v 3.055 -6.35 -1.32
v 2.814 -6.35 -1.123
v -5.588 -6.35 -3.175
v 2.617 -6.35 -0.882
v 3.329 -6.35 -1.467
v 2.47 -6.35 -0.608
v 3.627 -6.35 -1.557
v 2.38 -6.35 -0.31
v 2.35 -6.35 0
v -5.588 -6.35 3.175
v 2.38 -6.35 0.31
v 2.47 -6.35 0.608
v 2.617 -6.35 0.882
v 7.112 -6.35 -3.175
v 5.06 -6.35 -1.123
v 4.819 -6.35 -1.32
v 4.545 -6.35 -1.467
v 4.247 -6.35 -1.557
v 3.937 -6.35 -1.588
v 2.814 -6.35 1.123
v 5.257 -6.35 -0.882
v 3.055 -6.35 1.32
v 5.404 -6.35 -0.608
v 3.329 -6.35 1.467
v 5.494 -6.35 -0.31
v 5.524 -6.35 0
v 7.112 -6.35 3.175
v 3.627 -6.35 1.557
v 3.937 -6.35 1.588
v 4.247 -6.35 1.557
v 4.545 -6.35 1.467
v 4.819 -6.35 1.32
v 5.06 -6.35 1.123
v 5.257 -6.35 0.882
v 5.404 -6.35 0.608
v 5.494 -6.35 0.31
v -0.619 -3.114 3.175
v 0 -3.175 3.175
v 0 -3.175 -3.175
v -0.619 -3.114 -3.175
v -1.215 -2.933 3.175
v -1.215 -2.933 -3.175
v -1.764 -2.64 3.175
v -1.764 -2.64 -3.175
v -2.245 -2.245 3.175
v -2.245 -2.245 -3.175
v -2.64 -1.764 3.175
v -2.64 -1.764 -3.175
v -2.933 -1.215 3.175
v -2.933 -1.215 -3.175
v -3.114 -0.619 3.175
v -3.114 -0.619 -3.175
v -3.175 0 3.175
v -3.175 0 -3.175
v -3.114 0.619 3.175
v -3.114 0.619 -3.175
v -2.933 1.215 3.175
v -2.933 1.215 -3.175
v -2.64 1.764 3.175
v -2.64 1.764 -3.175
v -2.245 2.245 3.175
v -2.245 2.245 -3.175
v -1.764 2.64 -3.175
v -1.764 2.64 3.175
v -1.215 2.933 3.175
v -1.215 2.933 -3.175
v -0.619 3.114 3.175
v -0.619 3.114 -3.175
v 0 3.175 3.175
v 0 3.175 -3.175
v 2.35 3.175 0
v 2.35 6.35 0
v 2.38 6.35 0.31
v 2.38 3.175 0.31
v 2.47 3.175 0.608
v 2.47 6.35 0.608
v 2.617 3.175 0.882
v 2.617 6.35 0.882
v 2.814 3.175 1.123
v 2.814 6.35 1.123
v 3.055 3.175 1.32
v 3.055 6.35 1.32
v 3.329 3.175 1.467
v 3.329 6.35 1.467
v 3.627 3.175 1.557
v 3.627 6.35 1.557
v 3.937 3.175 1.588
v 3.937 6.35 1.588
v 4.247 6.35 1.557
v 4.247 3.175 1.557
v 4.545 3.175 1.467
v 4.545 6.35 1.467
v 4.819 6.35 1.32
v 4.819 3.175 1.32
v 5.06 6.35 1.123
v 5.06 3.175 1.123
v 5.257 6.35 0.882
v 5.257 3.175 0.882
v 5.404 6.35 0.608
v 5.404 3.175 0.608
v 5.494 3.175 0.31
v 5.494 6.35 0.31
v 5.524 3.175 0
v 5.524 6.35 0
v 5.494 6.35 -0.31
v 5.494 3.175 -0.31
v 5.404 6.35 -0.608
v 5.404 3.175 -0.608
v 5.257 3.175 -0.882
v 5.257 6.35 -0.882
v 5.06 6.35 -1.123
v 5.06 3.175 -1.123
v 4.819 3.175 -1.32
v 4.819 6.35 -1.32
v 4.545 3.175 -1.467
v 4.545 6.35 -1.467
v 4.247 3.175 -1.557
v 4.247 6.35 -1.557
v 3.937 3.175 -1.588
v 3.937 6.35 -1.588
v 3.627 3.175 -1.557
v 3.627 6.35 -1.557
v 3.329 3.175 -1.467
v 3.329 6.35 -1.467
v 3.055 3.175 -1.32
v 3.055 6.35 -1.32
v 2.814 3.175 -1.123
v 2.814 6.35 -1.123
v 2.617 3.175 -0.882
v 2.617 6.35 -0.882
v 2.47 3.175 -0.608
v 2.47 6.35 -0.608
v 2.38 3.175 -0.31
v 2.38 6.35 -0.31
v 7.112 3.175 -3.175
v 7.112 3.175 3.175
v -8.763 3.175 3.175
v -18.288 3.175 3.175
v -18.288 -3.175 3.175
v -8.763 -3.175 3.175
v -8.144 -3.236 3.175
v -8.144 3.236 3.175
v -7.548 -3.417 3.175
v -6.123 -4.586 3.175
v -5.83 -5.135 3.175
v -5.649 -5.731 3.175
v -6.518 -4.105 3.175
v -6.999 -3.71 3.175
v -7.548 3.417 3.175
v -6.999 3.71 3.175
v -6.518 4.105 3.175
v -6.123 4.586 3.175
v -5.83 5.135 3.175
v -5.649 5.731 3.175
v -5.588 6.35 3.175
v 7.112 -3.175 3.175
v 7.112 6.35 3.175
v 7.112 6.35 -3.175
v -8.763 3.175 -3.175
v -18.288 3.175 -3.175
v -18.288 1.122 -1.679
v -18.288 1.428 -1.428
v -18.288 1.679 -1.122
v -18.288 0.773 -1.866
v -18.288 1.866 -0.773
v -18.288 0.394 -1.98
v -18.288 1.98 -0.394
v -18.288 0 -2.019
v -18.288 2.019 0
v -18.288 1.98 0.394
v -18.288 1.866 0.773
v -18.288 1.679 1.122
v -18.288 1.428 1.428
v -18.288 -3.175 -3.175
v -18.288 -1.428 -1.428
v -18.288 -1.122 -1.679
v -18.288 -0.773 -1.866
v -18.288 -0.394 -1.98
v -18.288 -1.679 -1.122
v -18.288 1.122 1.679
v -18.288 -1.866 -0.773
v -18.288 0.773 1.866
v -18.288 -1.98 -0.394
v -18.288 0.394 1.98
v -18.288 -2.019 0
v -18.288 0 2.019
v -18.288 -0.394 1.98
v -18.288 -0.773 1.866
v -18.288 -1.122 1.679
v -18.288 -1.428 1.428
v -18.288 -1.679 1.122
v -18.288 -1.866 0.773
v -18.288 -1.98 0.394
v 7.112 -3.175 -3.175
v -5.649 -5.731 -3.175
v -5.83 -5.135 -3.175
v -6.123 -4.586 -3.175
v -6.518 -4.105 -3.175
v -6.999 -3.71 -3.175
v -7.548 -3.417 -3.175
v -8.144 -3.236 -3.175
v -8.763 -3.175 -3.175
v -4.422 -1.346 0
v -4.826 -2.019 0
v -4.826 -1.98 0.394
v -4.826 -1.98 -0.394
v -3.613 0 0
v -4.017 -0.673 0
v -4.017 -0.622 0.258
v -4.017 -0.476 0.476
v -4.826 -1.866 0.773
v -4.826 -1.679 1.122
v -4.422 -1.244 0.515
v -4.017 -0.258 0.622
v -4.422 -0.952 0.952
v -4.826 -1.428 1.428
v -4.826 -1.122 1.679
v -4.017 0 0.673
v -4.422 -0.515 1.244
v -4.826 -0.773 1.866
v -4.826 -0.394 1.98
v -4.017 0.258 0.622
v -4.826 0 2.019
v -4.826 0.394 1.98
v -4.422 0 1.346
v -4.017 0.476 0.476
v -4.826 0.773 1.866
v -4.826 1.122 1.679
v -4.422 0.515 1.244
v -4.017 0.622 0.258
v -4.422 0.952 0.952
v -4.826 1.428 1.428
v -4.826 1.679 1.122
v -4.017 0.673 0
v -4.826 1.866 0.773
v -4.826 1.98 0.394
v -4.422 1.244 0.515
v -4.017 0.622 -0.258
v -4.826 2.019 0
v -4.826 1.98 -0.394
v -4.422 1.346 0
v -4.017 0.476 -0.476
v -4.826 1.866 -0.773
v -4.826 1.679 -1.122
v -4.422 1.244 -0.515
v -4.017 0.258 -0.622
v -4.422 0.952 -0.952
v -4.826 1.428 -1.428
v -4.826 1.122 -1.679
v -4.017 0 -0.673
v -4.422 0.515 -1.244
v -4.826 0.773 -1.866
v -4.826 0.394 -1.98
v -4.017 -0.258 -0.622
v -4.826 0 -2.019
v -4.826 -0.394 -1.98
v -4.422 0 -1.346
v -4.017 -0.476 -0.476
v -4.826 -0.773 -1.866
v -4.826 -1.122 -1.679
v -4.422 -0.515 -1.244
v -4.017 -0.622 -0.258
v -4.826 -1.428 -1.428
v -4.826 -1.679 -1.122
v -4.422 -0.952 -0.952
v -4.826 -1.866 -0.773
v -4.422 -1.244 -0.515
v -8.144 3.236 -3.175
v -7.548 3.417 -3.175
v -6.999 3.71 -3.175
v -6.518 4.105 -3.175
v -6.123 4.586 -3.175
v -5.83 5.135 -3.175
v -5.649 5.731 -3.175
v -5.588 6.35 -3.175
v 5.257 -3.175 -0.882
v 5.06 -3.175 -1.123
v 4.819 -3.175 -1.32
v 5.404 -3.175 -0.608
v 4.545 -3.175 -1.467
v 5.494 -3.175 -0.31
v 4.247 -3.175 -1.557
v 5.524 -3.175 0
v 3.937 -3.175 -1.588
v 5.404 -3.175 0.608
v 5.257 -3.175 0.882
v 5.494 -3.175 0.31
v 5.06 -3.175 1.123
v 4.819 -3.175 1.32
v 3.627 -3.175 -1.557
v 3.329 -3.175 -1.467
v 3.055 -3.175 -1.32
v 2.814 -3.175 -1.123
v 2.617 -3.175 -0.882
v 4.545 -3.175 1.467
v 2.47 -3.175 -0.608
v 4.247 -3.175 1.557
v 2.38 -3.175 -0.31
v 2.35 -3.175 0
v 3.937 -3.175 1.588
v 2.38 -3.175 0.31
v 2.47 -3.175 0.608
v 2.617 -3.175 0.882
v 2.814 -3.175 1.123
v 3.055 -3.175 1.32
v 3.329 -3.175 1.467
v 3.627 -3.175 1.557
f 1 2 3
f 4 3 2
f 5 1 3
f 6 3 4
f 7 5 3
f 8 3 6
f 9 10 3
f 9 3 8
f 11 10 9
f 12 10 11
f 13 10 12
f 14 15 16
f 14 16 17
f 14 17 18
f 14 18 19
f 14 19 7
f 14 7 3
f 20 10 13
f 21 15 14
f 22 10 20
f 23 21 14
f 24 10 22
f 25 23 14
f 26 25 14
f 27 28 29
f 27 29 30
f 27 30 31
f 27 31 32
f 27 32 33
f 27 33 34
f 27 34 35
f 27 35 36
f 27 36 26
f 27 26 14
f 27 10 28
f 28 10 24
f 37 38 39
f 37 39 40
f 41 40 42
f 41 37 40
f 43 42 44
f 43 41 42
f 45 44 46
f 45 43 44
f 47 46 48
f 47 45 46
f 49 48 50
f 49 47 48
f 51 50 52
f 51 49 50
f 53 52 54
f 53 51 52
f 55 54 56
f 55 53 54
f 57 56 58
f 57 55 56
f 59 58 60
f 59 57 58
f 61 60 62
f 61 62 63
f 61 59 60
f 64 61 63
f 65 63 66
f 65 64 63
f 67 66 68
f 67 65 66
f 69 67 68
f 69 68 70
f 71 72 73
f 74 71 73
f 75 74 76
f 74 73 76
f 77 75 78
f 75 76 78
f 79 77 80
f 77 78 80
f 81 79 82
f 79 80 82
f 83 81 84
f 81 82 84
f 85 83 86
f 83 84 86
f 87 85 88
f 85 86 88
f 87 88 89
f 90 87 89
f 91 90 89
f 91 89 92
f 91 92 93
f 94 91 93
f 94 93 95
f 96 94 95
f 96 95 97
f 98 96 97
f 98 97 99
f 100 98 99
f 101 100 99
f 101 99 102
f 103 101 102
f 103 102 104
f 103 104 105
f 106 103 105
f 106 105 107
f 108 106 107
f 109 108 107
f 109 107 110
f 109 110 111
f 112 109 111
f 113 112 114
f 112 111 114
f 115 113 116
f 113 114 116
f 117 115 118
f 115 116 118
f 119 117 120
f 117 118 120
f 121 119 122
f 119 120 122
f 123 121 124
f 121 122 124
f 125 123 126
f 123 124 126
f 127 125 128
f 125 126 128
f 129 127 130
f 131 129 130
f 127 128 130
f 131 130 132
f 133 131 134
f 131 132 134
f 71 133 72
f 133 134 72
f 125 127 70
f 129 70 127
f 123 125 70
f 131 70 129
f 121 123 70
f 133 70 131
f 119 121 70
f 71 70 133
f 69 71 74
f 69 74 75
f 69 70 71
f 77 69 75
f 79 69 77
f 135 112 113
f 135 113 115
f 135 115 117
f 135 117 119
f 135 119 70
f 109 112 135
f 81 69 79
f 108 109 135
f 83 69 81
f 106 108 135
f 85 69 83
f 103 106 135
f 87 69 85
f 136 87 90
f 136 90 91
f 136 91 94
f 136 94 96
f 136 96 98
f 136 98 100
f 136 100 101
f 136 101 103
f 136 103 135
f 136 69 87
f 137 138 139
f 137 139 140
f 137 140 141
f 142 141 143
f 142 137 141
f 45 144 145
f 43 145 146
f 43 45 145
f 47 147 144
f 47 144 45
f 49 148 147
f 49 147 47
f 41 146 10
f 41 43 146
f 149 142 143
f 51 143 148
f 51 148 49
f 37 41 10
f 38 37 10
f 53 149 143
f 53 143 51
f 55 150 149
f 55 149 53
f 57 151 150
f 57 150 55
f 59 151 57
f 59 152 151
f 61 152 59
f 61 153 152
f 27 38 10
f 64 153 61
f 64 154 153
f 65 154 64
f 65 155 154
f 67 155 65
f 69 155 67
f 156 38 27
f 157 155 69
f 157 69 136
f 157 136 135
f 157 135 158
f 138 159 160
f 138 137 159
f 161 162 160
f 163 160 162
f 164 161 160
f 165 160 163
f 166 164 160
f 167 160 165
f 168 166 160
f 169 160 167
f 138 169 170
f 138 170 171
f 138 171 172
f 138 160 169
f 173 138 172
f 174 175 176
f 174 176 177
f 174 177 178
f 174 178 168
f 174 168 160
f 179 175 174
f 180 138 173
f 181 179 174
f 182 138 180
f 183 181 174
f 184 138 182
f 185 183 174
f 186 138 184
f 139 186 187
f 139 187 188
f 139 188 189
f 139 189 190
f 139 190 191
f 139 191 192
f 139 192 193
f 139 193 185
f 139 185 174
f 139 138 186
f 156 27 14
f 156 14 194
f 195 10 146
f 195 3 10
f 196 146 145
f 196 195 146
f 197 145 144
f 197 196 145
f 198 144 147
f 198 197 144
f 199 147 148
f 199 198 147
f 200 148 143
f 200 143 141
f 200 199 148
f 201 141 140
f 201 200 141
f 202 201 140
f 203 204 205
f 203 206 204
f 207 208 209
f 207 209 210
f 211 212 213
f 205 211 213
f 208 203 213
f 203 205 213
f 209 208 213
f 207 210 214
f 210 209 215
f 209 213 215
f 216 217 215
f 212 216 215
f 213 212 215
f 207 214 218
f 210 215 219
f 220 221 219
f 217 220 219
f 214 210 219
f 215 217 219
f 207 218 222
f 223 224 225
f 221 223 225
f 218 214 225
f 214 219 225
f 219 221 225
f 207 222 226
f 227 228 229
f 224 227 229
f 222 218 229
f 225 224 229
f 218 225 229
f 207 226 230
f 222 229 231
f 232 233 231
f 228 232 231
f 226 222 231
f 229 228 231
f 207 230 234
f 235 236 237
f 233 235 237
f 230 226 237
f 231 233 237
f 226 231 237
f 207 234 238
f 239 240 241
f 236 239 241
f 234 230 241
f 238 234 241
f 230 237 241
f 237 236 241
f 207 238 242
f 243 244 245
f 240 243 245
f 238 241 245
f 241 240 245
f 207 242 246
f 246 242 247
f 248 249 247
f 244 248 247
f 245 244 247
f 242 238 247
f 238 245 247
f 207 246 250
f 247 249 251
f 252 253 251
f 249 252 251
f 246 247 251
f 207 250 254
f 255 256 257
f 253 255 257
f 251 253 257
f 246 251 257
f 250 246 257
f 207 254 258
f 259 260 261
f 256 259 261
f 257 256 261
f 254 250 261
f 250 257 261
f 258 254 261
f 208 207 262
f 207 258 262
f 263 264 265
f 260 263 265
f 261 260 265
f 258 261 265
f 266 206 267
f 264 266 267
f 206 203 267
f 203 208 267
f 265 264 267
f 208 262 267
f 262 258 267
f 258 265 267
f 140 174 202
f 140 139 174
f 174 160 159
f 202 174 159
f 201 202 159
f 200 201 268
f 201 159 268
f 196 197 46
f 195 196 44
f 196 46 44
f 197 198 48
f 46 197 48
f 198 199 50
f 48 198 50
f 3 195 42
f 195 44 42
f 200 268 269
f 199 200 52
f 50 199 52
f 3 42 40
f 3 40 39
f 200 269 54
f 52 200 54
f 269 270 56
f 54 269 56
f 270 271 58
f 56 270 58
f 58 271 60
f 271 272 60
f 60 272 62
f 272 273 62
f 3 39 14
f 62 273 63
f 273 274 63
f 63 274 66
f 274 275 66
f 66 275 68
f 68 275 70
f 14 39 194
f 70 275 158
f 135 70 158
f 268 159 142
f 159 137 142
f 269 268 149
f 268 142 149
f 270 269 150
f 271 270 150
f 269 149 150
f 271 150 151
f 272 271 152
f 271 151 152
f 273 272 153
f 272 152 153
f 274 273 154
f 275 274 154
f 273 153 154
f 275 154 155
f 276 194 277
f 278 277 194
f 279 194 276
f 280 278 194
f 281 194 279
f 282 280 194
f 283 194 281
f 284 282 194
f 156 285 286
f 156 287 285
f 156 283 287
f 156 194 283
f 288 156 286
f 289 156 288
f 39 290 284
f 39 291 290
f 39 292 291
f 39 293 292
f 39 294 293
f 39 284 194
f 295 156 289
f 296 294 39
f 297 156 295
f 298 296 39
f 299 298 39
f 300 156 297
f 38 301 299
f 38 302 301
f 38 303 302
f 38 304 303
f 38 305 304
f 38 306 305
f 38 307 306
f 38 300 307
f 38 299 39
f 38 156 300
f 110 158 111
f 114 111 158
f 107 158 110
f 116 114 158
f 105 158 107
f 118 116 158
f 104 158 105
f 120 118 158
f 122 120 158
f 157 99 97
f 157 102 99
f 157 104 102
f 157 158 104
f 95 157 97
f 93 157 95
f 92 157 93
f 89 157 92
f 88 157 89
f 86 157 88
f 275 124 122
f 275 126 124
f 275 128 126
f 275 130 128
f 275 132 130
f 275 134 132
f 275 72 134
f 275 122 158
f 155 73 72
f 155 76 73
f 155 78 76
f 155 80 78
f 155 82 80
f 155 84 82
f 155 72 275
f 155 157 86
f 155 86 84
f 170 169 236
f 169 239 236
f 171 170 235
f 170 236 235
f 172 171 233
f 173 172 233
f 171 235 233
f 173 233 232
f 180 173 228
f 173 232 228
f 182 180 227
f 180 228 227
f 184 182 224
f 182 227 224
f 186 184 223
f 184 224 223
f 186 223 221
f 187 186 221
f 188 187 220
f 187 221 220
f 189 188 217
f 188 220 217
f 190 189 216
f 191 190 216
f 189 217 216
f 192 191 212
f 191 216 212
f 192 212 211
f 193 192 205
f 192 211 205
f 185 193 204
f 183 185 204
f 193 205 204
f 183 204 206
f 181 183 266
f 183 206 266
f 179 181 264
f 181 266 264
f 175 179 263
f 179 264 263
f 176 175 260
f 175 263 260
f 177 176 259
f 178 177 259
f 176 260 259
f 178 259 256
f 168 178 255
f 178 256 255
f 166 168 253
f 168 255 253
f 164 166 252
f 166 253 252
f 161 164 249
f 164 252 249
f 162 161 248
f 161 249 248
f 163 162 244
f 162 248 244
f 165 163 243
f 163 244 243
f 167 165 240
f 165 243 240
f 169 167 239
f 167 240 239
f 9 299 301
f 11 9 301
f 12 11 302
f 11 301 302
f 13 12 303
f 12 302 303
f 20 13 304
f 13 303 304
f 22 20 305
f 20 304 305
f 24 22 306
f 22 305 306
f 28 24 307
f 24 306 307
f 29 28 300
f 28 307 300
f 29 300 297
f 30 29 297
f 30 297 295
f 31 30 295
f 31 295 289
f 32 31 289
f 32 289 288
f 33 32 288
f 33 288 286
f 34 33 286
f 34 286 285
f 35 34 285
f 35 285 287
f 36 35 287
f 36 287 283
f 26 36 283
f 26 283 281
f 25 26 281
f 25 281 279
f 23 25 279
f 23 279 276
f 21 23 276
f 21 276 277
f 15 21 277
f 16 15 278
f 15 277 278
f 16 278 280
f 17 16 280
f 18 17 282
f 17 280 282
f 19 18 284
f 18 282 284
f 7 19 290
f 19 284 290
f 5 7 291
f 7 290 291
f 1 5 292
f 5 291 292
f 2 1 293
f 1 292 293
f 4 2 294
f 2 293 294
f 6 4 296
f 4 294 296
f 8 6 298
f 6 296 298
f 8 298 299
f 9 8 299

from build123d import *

# Parameters (mm, degrees)
F1_DEPTH = 3.175
F2_R     = 3.17499
F4_D     = 3.175
F6_D     = 4.0386
F6_DEPTH = 13.462
F6_TIP   = 1.213317848


# Not quite as in the source:
# - a fillet or chamfer is up to 0.001 mm smaller than in the source, because OpenCascade refuses the exact size


with BuildPart() as f1:
    # F0 (on Top) → F1 (new body, symmetric)
    with BuildSketch(Plane.XY):
        with BuildLine():
            Line((-5.588, -3.175), (-5.588, -6.35))
            Line((-5.588, -6.35), (7.112, -6.35))
            Line((7.112, -6.35), (7.112, -3.175))
            Line((7.112, -3.175), (0, -3.175))
            ThreePointArc((0, -3.175), (-3.175, 0), (0, 3.175))
            Line((0, 3.175), (7.112, 3.175))
            Line((7.112, 3.175), (7.112, 6.35))
            Line((7.112, 6.35), (-5.588, 6.35))
            Line((-5.588, 6.35), (-5.588, 3.175))
            Line((-5.588, 3.175), (-18.288, 3.175))
            Line((-18.288, 3.175), (-18.288, -3.175))
            Line((-18.288, -3.175), (-5.588, -3.175))
        make_face()
    extrude(amount=F1_DEPTH, both=True)

    # F2 (radius 3.175 in the source; OpenCascade refuses exactly that, so slightly less here)
    f2_edges = [f1.edges().sort_by_distance(p)[0] for p in [
        (-5.588, -3.175, 0),
        (-5.588, 3.175, 0),
    ]]
    fillet(f2_edges, radius=F2_R)

    # F4 (through all)
    with Locations(Plane.XZ.offset(6.35)):
        with Locations((3.937, 0)):
            Hole(F4_D / 2)

    # F6
    with Locations(Plane(origin=(-18.288, 0, 0), x_dir=(0, -1, 0), z_dir=(-1, 0, 0))):
        with Locations((0, 0)):
            Hole(F6_D / 2, depth=F6_DEPTH)
            with Locations((0, 0, -(F6_DEPTH + F6_TIP / 2))):  # 118° drill point
                Cone(0, F6_D / 2, F6_TIP, mode=Mode.SUBTRACT)


solid = f1.part
